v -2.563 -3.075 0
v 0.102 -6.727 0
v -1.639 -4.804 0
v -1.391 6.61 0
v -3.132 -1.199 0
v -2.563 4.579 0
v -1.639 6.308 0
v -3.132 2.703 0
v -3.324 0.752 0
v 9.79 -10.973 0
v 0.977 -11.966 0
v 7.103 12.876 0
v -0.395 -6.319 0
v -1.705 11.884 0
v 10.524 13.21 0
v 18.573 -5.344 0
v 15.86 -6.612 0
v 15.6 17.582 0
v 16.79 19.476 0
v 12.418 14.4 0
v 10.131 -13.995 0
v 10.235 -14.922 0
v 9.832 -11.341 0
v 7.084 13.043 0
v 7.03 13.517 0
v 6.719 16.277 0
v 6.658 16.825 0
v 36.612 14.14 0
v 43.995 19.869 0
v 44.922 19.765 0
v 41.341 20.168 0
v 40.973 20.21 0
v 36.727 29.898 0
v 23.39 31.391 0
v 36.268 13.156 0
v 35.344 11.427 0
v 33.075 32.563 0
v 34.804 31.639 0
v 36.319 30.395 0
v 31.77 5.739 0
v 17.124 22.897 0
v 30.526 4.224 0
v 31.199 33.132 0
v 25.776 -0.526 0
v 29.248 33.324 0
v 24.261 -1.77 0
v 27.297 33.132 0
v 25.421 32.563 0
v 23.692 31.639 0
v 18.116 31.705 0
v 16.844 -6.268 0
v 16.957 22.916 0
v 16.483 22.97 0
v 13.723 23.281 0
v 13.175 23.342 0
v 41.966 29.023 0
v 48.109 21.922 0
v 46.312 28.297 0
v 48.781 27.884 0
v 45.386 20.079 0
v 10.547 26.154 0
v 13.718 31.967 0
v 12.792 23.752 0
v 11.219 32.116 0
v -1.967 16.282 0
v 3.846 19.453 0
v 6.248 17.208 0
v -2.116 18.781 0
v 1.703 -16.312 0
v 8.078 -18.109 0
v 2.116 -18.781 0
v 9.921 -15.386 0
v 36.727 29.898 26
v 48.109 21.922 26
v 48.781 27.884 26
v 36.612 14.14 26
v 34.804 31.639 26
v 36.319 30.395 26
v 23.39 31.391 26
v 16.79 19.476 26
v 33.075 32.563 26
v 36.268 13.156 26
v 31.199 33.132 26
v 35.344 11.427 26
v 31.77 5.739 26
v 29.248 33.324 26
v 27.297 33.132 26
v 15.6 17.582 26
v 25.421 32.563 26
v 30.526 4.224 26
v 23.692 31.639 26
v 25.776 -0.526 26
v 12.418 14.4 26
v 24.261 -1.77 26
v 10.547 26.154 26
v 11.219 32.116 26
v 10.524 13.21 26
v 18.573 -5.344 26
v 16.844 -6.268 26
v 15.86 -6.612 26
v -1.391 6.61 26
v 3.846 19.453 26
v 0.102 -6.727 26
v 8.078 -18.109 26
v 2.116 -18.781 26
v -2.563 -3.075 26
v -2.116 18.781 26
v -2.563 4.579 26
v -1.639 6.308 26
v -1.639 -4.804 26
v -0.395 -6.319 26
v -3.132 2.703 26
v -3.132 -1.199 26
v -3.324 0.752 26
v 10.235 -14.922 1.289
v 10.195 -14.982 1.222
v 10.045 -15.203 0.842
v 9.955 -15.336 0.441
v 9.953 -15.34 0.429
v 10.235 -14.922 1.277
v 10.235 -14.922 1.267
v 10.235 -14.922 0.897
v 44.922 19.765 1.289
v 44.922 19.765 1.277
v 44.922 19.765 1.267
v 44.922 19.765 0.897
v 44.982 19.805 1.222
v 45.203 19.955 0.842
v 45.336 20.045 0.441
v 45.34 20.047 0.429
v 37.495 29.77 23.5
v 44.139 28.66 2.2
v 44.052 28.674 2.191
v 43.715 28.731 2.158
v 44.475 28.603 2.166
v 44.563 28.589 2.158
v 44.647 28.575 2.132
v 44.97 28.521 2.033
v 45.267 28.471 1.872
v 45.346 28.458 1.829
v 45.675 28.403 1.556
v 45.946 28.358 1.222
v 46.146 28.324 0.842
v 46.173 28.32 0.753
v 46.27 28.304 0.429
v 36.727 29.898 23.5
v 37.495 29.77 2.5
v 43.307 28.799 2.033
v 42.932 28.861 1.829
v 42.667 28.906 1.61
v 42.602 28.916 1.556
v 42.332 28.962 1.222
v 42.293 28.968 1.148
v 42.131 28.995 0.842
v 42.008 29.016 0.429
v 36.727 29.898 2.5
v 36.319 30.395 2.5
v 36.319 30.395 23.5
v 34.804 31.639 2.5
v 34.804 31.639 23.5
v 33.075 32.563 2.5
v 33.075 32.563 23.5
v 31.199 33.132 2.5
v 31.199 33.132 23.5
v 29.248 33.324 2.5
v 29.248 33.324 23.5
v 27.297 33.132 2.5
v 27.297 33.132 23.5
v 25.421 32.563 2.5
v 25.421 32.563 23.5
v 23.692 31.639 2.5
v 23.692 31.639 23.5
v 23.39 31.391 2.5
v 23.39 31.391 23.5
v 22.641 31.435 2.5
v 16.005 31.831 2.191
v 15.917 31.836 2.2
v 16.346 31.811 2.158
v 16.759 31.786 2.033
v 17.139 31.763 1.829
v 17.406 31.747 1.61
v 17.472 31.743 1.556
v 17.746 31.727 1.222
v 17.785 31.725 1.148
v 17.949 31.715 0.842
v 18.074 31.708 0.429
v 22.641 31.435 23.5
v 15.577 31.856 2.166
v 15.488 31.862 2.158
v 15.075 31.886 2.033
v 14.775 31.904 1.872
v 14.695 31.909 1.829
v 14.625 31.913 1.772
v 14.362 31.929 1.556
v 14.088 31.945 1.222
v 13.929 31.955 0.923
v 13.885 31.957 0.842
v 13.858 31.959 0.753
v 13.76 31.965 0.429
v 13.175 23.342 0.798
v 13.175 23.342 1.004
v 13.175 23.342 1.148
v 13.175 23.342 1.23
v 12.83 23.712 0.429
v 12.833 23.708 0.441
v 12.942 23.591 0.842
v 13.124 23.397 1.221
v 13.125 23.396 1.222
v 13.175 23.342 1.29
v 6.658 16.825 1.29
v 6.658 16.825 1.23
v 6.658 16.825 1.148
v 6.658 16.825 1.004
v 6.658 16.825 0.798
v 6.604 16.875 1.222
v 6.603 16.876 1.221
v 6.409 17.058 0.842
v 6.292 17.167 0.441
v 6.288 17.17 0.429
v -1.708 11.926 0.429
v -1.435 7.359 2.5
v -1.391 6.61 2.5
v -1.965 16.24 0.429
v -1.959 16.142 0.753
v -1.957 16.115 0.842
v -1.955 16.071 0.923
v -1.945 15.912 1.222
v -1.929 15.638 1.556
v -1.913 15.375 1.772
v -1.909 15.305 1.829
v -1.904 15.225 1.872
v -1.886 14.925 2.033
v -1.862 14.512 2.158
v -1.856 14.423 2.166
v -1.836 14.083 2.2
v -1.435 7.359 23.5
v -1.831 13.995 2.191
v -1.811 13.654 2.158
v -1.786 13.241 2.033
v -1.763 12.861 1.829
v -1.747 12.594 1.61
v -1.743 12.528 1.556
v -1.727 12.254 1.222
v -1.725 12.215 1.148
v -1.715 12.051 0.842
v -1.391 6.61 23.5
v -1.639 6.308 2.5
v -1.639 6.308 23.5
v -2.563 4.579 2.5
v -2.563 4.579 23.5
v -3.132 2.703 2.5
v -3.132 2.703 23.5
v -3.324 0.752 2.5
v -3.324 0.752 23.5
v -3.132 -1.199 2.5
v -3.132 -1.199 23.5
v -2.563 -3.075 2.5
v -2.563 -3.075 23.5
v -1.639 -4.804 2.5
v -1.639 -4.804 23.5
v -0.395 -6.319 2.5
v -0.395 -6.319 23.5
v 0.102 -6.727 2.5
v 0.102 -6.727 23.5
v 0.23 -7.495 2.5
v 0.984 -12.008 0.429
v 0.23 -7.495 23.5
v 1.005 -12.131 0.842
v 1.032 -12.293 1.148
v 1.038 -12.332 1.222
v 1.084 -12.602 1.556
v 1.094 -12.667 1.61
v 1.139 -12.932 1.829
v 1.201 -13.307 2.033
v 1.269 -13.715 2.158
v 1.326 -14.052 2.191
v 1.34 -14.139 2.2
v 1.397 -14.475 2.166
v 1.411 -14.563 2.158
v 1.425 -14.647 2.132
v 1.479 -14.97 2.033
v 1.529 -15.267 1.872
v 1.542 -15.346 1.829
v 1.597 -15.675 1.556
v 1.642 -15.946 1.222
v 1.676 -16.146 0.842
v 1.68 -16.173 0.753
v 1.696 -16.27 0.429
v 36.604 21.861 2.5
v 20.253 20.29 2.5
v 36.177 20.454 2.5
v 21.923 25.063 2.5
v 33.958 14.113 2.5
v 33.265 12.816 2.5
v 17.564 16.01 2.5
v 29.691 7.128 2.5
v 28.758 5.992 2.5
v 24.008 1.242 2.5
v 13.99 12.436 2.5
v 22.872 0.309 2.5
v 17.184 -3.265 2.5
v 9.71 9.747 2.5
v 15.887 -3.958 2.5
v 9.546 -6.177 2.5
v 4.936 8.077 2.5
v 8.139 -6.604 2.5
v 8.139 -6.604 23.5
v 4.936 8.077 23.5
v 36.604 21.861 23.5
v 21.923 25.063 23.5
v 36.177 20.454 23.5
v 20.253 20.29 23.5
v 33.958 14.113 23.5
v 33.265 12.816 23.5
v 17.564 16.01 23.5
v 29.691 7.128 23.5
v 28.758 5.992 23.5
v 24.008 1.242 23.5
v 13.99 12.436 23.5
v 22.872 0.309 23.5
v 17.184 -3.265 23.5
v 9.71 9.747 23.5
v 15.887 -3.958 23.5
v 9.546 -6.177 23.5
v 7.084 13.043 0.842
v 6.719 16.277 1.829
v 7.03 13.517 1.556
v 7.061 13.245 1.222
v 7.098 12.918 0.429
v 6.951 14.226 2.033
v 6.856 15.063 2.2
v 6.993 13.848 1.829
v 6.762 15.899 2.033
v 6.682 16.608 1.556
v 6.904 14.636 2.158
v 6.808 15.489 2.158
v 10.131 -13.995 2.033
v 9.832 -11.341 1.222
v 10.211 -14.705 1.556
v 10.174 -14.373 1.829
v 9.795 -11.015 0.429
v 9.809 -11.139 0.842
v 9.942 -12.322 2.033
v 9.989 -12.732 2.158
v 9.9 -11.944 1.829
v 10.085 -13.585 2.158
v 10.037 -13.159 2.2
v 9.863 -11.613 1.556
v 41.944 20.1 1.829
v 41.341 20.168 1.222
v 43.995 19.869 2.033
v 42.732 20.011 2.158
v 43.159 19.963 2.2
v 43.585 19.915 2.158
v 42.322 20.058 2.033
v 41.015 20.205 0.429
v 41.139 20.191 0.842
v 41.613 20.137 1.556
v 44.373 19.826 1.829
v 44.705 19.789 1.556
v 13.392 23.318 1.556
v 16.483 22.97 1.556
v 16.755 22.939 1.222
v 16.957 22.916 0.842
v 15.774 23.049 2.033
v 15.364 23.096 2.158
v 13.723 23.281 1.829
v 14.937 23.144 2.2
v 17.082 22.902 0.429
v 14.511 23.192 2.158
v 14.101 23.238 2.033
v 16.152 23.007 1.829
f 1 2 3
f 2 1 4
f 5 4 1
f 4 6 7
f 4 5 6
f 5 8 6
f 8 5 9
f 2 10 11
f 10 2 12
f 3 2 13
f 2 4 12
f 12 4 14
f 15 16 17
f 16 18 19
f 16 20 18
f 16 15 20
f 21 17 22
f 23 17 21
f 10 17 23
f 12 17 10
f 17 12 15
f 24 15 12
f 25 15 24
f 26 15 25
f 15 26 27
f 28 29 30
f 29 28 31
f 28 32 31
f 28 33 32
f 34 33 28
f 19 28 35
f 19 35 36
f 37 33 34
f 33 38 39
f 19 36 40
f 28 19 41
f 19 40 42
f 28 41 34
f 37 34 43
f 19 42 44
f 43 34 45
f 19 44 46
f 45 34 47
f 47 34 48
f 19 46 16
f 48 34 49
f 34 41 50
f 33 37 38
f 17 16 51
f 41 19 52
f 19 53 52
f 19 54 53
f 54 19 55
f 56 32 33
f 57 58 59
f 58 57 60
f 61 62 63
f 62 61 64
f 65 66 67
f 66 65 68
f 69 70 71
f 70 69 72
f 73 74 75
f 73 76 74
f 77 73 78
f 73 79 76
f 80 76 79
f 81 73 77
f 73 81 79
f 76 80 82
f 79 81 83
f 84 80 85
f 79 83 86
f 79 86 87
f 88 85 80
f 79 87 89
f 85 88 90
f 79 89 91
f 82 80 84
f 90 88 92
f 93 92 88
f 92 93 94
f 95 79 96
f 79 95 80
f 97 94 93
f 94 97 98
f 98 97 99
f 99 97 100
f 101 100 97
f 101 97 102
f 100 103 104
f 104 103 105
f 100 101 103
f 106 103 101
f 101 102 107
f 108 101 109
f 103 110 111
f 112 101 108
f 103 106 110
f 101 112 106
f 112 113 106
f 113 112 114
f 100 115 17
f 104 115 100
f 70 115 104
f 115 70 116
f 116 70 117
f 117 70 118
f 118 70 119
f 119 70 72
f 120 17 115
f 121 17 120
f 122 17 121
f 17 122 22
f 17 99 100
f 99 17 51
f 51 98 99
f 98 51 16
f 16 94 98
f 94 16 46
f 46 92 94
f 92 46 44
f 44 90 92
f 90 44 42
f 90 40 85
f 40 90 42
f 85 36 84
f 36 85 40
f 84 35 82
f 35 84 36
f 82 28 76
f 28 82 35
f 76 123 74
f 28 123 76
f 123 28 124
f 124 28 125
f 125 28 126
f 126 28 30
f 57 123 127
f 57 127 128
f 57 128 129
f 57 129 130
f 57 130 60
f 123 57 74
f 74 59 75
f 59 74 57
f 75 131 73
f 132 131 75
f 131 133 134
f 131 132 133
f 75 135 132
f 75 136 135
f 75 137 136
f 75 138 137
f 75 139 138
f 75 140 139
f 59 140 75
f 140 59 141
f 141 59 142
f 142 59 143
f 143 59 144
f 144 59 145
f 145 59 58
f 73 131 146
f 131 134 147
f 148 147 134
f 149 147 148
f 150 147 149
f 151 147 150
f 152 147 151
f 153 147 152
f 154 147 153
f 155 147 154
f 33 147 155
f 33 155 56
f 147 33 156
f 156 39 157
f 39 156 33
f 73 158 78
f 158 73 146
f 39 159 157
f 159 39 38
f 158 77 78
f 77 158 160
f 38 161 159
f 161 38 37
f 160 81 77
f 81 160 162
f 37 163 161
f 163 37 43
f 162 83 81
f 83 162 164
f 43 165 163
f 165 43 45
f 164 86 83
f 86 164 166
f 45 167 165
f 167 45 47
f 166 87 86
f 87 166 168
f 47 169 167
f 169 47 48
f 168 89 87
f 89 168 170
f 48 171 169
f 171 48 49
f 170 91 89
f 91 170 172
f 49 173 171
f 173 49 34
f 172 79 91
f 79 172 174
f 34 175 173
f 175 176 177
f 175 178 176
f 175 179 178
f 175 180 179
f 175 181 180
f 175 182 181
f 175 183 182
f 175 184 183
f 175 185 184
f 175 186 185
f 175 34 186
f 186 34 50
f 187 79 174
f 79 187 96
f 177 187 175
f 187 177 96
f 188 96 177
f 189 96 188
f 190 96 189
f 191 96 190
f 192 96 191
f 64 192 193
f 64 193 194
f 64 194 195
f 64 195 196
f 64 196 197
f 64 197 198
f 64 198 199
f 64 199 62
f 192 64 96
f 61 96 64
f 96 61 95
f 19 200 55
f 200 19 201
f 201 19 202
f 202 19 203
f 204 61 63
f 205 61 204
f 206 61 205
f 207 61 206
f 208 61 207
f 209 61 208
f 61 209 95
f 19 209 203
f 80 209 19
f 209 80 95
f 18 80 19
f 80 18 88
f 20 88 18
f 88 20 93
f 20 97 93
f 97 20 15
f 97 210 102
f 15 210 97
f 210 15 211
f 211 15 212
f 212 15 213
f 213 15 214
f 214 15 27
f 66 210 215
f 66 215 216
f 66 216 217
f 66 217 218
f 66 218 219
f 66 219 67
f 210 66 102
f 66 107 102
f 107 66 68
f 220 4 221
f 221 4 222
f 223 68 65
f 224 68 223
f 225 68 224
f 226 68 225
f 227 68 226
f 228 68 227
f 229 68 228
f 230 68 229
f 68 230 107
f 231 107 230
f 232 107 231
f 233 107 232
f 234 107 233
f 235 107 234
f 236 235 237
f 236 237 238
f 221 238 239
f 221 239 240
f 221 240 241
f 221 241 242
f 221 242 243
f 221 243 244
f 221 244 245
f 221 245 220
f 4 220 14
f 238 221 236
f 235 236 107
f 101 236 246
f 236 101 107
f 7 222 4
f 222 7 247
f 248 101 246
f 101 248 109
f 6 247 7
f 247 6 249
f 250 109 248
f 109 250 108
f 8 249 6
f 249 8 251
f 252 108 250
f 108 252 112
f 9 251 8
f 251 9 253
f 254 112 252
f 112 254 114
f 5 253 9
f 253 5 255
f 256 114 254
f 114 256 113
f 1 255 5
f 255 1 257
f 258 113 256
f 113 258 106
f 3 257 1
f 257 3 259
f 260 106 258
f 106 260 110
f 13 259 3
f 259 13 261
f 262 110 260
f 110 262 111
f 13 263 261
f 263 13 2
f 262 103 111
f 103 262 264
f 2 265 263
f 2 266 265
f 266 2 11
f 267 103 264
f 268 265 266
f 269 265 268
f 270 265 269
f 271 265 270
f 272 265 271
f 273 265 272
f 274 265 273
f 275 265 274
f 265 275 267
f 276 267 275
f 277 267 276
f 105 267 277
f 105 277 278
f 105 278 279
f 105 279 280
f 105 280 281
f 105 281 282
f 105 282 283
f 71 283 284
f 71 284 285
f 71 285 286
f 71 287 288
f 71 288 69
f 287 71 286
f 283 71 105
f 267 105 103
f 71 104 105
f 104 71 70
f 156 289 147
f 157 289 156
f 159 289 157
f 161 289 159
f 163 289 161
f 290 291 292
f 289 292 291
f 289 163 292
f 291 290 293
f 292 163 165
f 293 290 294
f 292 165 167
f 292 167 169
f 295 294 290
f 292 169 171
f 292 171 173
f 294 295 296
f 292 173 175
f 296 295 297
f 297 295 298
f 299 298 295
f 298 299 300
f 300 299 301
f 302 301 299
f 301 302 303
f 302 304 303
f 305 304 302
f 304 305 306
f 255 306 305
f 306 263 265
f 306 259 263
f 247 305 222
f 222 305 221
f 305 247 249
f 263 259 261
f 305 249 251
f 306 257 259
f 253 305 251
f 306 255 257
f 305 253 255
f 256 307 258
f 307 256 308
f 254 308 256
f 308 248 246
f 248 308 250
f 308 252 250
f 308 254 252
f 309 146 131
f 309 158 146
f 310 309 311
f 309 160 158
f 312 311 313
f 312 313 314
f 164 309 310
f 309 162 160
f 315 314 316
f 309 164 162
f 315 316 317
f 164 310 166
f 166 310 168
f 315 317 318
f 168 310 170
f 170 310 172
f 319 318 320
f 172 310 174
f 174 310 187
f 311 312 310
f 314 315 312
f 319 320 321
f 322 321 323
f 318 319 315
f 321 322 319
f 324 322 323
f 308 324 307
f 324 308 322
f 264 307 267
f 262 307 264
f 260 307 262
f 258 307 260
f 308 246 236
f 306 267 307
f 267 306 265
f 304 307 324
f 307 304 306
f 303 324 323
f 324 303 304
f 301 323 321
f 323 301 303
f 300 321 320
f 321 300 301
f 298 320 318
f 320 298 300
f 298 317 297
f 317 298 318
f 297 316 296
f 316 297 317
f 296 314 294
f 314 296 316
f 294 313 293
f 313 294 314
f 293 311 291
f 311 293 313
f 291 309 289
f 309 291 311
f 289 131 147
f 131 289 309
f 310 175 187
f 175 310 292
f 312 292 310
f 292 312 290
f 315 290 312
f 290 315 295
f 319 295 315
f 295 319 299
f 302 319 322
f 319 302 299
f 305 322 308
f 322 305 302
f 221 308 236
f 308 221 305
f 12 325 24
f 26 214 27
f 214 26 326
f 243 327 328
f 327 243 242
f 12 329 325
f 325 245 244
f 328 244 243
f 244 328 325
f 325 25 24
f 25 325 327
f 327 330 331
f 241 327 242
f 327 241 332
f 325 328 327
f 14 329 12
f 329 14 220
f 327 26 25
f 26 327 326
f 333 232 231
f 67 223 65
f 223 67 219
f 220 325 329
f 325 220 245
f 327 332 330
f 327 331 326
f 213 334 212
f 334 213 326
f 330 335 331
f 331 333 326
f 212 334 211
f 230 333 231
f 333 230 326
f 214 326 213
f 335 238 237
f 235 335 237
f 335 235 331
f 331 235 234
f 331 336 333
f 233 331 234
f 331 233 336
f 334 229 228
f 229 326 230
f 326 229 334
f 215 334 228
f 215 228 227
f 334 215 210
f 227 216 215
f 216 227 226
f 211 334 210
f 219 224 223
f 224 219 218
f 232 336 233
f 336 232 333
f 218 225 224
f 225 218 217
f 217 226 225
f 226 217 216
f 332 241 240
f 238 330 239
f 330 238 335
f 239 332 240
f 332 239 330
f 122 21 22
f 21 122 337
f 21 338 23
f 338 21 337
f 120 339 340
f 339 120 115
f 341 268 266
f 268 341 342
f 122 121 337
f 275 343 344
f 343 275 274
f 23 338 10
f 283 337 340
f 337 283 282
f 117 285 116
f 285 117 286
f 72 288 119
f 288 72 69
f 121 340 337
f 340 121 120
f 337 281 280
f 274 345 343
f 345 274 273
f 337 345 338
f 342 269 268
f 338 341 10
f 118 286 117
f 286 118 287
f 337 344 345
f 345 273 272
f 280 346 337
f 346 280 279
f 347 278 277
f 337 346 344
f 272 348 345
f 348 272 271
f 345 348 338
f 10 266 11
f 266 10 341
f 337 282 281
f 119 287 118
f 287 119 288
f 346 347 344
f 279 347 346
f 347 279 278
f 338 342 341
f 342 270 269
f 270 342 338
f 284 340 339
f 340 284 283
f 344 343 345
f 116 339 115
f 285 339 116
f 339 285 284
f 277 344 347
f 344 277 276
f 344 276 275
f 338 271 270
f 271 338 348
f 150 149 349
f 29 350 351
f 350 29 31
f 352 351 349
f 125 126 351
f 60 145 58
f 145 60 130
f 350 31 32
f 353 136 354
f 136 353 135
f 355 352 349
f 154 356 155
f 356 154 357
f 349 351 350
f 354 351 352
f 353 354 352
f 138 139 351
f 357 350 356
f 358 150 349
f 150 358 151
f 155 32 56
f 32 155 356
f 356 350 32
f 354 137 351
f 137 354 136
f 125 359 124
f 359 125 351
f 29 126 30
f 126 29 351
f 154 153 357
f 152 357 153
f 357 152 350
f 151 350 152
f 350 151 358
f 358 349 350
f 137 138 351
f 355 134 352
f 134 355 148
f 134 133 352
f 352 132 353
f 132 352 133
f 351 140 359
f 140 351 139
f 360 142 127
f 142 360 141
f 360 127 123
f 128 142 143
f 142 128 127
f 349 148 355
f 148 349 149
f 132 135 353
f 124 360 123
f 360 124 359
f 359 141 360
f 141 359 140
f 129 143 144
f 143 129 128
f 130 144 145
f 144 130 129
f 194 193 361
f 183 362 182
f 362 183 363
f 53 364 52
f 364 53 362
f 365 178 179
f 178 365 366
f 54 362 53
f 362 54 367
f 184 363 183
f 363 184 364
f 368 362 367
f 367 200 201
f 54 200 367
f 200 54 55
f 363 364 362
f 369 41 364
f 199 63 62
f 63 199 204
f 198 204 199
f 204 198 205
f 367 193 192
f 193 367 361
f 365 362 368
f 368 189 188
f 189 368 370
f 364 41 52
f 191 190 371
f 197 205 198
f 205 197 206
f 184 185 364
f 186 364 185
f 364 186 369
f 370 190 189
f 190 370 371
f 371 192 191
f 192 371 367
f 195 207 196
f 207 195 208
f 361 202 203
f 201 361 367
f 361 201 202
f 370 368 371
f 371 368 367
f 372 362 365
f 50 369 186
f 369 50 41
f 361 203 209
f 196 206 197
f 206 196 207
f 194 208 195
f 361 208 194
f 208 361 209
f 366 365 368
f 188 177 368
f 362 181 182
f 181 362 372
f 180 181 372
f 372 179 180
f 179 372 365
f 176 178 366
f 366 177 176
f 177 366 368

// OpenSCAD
$fn = 32;

// ----------------------------------------------------------------------
// Air duct: 20 mm duct, 2.5 mm wall, 26 mm across
// ----------------------------------------------------------------------

// --- parameters (mm) ---
duct_r = 10;              // duct core radius
duct_d = 20;              // duct core diameter
wall = 2.5;               // duct wall thickness
height = 26;              // duct width (extrusion height)
port_r = 18.9;            // port flange half width
port_d = 37.8;            // port flange width
port_t = 6;               // port flange thickness
bolt_d = 4.4;             // port bolt holes
bolt_offset = 14.2;       // bolt hole offset from the port axis

difference() {
  /* outer hull chain: tube with a flat flange plate at every port */
  linear_extrude(height = 26) {
    hull() {
      polygon([[2.116, -18.781], [-2.116, 18.781], [3.846, 19.453], [8.078, -18.109]]);
      translate([8.943, 1.008]) circle(r = 10);
    }
    hull() {
      translate([8.943, 1.008]) circle(r = 10);
      translate([6.676, 0.752]) circle(r = 10);
    }
    hull() {
      translate([6.676, 0.752]) circle(r = 10);
      translate([13.017, 2.971]) circle(r = 10);
    }
    hull() {
      translate([13.017, 2.971]) circle(r = 10);
      translate([18.705, 6.545]) circle(r = 10);
    }
    hull() {
      translate([18.705, 6.545]) circle(r = 10);
      translate([23.455, 11.295]) circle(r = 10);
    }
    hull() {
      translate([23.455, 11.295]) circle(r = 10);
      translate([27.029, 16.983]) circle(r = 10);
    }
    hull() {
      translate([27.029, 16.983]) circle(r = 10);
      translate([29.248, 23.324]) circle(r = 10);
    }
    hull() {
      translate([29.248, 23.324]) circle(r = 10);
      translate([28.992, 21.057]) circle(r = 10);
    }
    hull() {
      translate([28.992, 21.057]) circle(r = 10);
      polygon([[11.219, 32.116], [48.781, 27.884], [48.109, 21.922], [10.547, 26.154]]);
    }
  }
  /* air passage: the same chain inset by the wall, 5 mm proud of the ports */
  translate([0, 0, 2.5]) linear_extrude(height = 21) {
    hull() {
      translate([-4.969, -0.56]) circle(r = 7.5);
      translate([6.676, 0.752]) circle(r = 7.5);
    }
    hull() {
      translate([6.676, 0.752]) circle(r = 7.5);
      translate([13.017, 2.971]) circle(r = 7.5);
    }
    hull() {
      translate([13.017, 2.971]) circle(r = 7.5);
      translate([18.705, 6.545]) circle(r = 7.5);
    }
    hull() {
      translate([18.705, 6.545]) circle(r = 7.5);
      translate([23.455, 11.295]) circle(r = 7.5);
    }
    hull() {
      translate([23.455, 11.295]) circle(r = 7.5);
      translate([27.029, 16.983]) circle(r = 7.5);
    }
    hull() {
      translate([27.029, 16.983]) circle(r = 7.5);
      translate([29.248, 23.324]) circle(r = 7.5);
    }
    hull() {
      translate([29.248, 23.324]) circle(r = 7.5);
      translate([30.56, 34.969]) circle(r = 7.5);
    }
  }
  translate([0, 0]) rotate([0, 0, -83.57]) translate([-14.2, -2.5]) rotate([-90, 0, 0]) cylinder(h = 11, d = 4.4);
  translate([0, 0]) rotate([0, 0, -83.57]) translate([14.2, -2.5]) rotate([-90, 0, 0]) cylinder(h = 11, d = 4.4);
  translate([30, 30]) rotate([0, 0, 173.57]) translate([-14.2, -2.5]) rotate([-90, 0, 0]) cylinder(h = 11, d = 4.4);
  translate([30, 30]) rotate([0, 0, 173.57]) translate([14.2, -2.5]) rotate([-90, 0, 0]) cylinder(h = 11, d = 4.4);
}
